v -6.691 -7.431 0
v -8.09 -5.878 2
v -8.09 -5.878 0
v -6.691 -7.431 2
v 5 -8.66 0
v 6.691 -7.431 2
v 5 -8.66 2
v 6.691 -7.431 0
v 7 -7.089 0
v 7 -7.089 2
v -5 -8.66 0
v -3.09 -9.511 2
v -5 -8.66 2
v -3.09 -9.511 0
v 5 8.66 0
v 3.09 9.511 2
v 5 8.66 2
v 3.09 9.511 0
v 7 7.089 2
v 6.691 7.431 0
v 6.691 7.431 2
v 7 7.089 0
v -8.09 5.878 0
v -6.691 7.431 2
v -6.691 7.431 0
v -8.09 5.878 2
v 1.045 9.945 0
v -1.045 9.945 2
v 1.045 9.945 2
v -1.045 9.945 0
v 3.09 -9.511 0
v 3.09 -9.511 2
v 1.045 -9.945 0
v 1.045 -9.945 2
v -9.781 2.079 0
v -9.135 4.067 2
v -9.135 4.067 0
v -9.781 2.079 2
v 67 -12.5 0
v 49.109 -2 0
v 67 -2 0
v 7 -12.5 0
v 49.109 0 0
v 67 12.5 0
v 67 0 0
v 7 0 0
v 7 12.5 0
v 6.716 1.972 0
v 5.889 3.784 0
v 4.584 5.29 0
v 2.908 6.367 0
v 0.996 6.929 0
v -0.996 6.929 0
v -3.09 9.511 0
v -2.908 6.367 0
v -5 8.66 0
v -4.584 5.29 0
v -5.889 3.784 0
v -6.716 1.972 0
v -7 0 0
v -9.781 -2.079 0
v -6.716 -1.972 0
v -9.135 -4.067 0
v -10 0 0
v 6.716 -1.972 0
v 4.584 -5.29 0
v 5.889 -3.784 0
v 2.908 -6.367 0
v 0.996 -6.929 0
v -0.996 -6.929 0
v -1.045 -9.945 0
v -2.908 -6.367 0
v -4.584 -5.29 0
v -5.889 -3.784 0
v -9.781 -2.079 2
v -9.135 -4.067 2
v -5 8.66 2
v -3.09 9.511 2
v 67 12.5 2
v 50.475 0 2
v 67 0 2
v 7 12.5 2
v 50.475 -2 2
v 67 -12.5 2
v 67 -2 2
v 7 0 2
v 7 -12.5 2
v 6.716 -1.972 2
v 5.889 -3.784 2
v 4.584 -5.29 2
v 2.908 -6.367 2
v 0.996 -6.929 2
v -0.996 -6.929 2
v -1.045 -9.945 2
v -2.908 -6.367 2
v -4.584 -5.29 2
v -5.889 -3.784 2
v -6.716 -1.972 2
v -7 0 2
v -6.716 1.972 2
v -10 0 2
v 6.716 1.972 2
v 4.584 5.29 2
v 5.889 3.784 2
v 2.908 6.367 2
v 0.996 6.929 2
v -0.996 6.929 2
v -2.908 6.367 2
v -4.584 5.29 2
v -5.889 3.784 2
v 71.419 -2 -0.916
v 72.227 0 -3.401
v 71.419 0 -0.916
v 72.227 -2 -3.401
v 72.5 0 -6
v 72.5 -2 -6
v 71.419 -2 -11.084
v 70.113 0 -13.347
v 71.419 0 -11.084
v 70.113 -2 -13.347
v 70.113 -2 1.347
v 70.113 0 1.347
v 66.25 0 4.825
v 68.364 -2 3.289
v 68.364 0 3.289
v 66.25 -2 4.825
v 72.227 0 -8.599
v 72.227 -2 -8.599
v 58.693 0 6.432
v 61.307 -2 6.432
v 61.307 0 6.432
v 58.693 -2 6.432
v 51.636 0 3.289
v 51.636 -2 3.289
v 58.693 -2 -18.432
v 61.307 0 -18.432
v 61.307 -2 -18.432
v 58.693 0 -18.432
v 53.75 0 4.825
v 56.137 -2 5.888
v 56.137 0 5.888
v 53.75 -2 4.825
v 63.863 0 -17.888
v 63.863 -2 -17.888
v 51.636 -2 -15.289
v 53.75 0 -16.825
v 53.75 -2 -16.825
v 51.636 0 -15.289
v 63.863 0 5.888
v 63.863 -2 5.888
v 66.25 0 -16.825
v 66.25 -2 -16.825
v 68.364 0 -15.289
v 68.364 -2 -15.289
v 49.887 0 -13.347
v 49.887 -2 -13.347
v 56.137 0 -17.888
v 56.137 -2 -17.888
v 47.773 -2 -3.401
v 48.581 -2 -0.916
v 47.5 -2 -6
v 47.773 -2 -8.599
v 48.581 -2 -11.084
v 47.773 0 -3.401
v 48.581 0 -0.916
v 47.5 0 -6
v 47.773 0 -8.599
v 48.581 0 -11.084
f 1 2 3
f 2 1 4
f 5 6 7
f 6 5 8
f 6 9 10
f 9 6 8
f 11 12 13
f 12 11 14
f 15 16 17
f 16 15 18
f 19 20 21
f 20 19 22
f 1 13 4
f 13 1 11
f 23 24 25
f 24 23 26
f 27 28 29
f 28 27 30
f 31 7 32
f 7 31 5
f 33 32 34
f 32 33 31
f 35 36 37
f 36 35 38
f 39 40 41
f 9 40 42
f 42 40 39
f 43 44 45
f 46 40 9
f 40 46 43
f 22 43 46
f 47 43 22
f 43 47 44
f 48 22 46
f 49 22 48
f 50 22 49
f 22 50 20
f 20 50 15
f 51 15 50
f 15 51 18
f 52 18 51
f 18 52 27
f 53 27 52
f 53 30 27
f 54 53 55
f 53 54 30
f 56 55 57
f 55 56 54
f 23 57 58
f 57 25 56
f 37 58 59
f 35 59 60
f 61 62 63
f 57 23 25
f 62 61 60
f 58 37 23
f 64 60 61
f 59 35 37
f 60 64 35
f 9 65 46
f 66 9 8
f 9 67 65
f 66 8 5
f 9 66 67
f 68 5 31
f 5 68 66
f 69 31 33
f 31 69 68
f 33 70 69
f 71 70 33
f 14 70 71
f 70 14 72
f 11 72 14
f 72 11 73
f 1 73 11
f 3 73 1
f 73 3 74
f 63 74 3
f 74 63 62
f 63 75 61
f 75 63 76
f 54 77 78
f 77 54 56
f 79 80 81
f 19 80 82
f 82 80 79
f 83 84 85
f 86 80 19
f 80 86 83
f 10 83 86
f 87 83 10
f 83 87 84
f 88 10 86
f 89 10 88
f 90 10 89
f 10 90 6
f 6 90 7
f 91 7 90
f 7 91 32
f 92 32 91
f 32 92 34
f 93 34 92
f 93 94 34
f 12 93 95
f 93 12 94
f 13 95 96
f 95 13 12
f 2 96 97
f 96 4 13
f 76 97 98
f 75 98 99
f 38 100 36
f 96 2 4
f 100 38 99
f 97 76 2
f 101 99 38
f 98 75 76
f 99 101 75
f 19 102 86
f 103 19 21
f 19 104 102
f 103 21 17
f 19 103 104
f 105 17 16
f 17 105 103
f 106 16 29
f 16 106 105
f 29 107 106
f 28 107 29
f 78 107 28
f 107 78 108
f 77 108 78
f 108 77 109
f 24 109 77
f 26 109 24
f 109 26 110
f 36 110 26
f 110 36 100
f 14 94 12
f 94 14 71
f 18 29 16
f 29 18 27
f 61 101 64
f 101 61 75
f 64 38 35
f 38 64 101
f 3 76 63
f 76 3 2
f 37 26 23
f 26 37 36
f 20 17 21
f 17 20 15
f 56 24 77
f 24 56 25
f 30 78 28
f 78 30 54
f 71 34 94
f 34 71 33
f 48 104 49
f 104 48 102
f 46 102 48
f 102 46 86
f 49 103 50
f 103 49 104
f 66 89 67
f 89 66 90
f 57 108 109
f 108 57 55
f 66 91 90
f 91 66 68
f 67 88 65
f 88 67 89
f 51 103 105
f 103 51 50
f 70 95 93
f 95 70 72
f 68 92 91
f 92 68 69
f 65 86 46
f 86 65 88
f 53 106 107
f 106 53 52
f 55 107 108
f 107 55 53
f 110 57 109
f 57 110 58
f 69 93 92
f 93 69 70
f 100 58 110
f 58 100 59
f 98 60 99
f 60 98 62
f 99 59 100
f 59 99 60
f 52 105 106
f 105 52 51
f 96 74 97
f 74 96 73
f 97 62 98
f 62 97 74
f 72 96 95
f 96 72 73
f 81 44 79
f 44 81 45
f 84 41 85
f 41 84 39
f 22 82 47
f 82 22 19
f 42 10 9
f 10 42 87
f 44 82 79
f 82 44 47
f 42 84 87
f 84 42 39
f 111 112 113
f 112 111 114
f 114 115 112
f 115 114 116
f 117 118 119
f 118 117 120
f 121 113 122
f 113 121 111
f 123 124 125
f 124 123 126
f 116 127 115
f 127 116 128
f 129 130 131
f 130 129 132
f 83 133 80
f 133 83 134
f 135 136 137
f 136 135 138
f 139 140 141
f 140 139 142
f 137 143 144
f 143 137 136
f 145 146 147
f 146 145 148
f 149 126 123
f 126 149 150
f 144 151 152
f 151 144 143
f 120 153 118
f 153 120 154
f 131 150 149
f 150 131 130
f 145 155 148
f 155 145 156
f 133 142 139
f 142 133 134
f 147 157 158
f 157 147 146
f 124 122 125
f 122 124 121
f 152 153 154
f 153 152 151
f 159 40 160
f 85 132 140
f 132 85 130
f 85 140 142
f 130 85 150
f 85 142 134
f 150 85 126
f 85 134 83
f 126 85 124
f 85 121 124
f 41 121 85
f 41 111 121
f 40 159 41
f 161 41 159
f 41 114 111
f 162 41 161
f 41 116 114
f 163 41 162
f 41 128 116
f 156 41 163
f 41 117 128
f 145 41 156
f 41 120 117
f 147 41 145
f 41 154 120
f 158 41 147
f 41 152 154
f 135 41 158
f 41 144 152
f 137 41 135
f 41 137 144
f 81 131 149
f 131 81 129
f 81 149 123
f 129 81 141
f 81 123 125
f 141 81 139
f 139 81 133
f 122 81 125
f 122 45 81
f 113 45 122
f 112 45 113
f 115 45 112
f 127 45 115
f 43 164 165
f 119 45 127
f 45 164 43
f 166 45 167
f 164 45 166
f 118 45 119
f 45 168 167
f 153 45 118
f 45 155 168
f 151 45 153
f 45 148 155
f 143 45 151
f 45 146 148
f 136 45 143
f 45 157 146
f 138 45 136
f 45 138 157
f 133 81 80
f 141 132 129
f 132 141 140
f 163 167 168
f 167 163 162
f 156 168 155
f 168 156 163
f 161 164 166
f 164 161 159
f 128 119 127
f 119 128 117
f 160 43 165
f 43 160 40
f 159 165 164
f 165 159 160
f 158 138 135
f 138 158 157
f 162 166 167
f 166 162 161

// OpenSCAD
ribbon_width = 25;
ribbon_thickness = 2;
ribbon_length = 60;
loop_diameter = 14;
fold_depth = 6;

module ribbon_loop(){
difference(){
cylinder(d=loop_diameter+6,h=ribbon_thickness);
translate([0,0,-1])
cylinder(d=loop_diameter,h=ribbon_thickness+2);
}
}

module ribbon_strap(){
translate([0,-ribbon_width/2,0])
cube([ribbon_length,ribbon_width,ribbon_thickness]);
}

module ribbon_fold(){
translate([ribbon_length/2,0,-fold_depth])
rotate([90,0,0])
cylinder(d=ribbon_width,h=ribbon_thickness);
}

module ribbon(){
union(){
ribbon_loop();
translate([loop_diameter/2,0,0]) ribbon_strap();
translate([ribbon_length/2,0,0]) ribbon_fold();
}
}

ribbon();
